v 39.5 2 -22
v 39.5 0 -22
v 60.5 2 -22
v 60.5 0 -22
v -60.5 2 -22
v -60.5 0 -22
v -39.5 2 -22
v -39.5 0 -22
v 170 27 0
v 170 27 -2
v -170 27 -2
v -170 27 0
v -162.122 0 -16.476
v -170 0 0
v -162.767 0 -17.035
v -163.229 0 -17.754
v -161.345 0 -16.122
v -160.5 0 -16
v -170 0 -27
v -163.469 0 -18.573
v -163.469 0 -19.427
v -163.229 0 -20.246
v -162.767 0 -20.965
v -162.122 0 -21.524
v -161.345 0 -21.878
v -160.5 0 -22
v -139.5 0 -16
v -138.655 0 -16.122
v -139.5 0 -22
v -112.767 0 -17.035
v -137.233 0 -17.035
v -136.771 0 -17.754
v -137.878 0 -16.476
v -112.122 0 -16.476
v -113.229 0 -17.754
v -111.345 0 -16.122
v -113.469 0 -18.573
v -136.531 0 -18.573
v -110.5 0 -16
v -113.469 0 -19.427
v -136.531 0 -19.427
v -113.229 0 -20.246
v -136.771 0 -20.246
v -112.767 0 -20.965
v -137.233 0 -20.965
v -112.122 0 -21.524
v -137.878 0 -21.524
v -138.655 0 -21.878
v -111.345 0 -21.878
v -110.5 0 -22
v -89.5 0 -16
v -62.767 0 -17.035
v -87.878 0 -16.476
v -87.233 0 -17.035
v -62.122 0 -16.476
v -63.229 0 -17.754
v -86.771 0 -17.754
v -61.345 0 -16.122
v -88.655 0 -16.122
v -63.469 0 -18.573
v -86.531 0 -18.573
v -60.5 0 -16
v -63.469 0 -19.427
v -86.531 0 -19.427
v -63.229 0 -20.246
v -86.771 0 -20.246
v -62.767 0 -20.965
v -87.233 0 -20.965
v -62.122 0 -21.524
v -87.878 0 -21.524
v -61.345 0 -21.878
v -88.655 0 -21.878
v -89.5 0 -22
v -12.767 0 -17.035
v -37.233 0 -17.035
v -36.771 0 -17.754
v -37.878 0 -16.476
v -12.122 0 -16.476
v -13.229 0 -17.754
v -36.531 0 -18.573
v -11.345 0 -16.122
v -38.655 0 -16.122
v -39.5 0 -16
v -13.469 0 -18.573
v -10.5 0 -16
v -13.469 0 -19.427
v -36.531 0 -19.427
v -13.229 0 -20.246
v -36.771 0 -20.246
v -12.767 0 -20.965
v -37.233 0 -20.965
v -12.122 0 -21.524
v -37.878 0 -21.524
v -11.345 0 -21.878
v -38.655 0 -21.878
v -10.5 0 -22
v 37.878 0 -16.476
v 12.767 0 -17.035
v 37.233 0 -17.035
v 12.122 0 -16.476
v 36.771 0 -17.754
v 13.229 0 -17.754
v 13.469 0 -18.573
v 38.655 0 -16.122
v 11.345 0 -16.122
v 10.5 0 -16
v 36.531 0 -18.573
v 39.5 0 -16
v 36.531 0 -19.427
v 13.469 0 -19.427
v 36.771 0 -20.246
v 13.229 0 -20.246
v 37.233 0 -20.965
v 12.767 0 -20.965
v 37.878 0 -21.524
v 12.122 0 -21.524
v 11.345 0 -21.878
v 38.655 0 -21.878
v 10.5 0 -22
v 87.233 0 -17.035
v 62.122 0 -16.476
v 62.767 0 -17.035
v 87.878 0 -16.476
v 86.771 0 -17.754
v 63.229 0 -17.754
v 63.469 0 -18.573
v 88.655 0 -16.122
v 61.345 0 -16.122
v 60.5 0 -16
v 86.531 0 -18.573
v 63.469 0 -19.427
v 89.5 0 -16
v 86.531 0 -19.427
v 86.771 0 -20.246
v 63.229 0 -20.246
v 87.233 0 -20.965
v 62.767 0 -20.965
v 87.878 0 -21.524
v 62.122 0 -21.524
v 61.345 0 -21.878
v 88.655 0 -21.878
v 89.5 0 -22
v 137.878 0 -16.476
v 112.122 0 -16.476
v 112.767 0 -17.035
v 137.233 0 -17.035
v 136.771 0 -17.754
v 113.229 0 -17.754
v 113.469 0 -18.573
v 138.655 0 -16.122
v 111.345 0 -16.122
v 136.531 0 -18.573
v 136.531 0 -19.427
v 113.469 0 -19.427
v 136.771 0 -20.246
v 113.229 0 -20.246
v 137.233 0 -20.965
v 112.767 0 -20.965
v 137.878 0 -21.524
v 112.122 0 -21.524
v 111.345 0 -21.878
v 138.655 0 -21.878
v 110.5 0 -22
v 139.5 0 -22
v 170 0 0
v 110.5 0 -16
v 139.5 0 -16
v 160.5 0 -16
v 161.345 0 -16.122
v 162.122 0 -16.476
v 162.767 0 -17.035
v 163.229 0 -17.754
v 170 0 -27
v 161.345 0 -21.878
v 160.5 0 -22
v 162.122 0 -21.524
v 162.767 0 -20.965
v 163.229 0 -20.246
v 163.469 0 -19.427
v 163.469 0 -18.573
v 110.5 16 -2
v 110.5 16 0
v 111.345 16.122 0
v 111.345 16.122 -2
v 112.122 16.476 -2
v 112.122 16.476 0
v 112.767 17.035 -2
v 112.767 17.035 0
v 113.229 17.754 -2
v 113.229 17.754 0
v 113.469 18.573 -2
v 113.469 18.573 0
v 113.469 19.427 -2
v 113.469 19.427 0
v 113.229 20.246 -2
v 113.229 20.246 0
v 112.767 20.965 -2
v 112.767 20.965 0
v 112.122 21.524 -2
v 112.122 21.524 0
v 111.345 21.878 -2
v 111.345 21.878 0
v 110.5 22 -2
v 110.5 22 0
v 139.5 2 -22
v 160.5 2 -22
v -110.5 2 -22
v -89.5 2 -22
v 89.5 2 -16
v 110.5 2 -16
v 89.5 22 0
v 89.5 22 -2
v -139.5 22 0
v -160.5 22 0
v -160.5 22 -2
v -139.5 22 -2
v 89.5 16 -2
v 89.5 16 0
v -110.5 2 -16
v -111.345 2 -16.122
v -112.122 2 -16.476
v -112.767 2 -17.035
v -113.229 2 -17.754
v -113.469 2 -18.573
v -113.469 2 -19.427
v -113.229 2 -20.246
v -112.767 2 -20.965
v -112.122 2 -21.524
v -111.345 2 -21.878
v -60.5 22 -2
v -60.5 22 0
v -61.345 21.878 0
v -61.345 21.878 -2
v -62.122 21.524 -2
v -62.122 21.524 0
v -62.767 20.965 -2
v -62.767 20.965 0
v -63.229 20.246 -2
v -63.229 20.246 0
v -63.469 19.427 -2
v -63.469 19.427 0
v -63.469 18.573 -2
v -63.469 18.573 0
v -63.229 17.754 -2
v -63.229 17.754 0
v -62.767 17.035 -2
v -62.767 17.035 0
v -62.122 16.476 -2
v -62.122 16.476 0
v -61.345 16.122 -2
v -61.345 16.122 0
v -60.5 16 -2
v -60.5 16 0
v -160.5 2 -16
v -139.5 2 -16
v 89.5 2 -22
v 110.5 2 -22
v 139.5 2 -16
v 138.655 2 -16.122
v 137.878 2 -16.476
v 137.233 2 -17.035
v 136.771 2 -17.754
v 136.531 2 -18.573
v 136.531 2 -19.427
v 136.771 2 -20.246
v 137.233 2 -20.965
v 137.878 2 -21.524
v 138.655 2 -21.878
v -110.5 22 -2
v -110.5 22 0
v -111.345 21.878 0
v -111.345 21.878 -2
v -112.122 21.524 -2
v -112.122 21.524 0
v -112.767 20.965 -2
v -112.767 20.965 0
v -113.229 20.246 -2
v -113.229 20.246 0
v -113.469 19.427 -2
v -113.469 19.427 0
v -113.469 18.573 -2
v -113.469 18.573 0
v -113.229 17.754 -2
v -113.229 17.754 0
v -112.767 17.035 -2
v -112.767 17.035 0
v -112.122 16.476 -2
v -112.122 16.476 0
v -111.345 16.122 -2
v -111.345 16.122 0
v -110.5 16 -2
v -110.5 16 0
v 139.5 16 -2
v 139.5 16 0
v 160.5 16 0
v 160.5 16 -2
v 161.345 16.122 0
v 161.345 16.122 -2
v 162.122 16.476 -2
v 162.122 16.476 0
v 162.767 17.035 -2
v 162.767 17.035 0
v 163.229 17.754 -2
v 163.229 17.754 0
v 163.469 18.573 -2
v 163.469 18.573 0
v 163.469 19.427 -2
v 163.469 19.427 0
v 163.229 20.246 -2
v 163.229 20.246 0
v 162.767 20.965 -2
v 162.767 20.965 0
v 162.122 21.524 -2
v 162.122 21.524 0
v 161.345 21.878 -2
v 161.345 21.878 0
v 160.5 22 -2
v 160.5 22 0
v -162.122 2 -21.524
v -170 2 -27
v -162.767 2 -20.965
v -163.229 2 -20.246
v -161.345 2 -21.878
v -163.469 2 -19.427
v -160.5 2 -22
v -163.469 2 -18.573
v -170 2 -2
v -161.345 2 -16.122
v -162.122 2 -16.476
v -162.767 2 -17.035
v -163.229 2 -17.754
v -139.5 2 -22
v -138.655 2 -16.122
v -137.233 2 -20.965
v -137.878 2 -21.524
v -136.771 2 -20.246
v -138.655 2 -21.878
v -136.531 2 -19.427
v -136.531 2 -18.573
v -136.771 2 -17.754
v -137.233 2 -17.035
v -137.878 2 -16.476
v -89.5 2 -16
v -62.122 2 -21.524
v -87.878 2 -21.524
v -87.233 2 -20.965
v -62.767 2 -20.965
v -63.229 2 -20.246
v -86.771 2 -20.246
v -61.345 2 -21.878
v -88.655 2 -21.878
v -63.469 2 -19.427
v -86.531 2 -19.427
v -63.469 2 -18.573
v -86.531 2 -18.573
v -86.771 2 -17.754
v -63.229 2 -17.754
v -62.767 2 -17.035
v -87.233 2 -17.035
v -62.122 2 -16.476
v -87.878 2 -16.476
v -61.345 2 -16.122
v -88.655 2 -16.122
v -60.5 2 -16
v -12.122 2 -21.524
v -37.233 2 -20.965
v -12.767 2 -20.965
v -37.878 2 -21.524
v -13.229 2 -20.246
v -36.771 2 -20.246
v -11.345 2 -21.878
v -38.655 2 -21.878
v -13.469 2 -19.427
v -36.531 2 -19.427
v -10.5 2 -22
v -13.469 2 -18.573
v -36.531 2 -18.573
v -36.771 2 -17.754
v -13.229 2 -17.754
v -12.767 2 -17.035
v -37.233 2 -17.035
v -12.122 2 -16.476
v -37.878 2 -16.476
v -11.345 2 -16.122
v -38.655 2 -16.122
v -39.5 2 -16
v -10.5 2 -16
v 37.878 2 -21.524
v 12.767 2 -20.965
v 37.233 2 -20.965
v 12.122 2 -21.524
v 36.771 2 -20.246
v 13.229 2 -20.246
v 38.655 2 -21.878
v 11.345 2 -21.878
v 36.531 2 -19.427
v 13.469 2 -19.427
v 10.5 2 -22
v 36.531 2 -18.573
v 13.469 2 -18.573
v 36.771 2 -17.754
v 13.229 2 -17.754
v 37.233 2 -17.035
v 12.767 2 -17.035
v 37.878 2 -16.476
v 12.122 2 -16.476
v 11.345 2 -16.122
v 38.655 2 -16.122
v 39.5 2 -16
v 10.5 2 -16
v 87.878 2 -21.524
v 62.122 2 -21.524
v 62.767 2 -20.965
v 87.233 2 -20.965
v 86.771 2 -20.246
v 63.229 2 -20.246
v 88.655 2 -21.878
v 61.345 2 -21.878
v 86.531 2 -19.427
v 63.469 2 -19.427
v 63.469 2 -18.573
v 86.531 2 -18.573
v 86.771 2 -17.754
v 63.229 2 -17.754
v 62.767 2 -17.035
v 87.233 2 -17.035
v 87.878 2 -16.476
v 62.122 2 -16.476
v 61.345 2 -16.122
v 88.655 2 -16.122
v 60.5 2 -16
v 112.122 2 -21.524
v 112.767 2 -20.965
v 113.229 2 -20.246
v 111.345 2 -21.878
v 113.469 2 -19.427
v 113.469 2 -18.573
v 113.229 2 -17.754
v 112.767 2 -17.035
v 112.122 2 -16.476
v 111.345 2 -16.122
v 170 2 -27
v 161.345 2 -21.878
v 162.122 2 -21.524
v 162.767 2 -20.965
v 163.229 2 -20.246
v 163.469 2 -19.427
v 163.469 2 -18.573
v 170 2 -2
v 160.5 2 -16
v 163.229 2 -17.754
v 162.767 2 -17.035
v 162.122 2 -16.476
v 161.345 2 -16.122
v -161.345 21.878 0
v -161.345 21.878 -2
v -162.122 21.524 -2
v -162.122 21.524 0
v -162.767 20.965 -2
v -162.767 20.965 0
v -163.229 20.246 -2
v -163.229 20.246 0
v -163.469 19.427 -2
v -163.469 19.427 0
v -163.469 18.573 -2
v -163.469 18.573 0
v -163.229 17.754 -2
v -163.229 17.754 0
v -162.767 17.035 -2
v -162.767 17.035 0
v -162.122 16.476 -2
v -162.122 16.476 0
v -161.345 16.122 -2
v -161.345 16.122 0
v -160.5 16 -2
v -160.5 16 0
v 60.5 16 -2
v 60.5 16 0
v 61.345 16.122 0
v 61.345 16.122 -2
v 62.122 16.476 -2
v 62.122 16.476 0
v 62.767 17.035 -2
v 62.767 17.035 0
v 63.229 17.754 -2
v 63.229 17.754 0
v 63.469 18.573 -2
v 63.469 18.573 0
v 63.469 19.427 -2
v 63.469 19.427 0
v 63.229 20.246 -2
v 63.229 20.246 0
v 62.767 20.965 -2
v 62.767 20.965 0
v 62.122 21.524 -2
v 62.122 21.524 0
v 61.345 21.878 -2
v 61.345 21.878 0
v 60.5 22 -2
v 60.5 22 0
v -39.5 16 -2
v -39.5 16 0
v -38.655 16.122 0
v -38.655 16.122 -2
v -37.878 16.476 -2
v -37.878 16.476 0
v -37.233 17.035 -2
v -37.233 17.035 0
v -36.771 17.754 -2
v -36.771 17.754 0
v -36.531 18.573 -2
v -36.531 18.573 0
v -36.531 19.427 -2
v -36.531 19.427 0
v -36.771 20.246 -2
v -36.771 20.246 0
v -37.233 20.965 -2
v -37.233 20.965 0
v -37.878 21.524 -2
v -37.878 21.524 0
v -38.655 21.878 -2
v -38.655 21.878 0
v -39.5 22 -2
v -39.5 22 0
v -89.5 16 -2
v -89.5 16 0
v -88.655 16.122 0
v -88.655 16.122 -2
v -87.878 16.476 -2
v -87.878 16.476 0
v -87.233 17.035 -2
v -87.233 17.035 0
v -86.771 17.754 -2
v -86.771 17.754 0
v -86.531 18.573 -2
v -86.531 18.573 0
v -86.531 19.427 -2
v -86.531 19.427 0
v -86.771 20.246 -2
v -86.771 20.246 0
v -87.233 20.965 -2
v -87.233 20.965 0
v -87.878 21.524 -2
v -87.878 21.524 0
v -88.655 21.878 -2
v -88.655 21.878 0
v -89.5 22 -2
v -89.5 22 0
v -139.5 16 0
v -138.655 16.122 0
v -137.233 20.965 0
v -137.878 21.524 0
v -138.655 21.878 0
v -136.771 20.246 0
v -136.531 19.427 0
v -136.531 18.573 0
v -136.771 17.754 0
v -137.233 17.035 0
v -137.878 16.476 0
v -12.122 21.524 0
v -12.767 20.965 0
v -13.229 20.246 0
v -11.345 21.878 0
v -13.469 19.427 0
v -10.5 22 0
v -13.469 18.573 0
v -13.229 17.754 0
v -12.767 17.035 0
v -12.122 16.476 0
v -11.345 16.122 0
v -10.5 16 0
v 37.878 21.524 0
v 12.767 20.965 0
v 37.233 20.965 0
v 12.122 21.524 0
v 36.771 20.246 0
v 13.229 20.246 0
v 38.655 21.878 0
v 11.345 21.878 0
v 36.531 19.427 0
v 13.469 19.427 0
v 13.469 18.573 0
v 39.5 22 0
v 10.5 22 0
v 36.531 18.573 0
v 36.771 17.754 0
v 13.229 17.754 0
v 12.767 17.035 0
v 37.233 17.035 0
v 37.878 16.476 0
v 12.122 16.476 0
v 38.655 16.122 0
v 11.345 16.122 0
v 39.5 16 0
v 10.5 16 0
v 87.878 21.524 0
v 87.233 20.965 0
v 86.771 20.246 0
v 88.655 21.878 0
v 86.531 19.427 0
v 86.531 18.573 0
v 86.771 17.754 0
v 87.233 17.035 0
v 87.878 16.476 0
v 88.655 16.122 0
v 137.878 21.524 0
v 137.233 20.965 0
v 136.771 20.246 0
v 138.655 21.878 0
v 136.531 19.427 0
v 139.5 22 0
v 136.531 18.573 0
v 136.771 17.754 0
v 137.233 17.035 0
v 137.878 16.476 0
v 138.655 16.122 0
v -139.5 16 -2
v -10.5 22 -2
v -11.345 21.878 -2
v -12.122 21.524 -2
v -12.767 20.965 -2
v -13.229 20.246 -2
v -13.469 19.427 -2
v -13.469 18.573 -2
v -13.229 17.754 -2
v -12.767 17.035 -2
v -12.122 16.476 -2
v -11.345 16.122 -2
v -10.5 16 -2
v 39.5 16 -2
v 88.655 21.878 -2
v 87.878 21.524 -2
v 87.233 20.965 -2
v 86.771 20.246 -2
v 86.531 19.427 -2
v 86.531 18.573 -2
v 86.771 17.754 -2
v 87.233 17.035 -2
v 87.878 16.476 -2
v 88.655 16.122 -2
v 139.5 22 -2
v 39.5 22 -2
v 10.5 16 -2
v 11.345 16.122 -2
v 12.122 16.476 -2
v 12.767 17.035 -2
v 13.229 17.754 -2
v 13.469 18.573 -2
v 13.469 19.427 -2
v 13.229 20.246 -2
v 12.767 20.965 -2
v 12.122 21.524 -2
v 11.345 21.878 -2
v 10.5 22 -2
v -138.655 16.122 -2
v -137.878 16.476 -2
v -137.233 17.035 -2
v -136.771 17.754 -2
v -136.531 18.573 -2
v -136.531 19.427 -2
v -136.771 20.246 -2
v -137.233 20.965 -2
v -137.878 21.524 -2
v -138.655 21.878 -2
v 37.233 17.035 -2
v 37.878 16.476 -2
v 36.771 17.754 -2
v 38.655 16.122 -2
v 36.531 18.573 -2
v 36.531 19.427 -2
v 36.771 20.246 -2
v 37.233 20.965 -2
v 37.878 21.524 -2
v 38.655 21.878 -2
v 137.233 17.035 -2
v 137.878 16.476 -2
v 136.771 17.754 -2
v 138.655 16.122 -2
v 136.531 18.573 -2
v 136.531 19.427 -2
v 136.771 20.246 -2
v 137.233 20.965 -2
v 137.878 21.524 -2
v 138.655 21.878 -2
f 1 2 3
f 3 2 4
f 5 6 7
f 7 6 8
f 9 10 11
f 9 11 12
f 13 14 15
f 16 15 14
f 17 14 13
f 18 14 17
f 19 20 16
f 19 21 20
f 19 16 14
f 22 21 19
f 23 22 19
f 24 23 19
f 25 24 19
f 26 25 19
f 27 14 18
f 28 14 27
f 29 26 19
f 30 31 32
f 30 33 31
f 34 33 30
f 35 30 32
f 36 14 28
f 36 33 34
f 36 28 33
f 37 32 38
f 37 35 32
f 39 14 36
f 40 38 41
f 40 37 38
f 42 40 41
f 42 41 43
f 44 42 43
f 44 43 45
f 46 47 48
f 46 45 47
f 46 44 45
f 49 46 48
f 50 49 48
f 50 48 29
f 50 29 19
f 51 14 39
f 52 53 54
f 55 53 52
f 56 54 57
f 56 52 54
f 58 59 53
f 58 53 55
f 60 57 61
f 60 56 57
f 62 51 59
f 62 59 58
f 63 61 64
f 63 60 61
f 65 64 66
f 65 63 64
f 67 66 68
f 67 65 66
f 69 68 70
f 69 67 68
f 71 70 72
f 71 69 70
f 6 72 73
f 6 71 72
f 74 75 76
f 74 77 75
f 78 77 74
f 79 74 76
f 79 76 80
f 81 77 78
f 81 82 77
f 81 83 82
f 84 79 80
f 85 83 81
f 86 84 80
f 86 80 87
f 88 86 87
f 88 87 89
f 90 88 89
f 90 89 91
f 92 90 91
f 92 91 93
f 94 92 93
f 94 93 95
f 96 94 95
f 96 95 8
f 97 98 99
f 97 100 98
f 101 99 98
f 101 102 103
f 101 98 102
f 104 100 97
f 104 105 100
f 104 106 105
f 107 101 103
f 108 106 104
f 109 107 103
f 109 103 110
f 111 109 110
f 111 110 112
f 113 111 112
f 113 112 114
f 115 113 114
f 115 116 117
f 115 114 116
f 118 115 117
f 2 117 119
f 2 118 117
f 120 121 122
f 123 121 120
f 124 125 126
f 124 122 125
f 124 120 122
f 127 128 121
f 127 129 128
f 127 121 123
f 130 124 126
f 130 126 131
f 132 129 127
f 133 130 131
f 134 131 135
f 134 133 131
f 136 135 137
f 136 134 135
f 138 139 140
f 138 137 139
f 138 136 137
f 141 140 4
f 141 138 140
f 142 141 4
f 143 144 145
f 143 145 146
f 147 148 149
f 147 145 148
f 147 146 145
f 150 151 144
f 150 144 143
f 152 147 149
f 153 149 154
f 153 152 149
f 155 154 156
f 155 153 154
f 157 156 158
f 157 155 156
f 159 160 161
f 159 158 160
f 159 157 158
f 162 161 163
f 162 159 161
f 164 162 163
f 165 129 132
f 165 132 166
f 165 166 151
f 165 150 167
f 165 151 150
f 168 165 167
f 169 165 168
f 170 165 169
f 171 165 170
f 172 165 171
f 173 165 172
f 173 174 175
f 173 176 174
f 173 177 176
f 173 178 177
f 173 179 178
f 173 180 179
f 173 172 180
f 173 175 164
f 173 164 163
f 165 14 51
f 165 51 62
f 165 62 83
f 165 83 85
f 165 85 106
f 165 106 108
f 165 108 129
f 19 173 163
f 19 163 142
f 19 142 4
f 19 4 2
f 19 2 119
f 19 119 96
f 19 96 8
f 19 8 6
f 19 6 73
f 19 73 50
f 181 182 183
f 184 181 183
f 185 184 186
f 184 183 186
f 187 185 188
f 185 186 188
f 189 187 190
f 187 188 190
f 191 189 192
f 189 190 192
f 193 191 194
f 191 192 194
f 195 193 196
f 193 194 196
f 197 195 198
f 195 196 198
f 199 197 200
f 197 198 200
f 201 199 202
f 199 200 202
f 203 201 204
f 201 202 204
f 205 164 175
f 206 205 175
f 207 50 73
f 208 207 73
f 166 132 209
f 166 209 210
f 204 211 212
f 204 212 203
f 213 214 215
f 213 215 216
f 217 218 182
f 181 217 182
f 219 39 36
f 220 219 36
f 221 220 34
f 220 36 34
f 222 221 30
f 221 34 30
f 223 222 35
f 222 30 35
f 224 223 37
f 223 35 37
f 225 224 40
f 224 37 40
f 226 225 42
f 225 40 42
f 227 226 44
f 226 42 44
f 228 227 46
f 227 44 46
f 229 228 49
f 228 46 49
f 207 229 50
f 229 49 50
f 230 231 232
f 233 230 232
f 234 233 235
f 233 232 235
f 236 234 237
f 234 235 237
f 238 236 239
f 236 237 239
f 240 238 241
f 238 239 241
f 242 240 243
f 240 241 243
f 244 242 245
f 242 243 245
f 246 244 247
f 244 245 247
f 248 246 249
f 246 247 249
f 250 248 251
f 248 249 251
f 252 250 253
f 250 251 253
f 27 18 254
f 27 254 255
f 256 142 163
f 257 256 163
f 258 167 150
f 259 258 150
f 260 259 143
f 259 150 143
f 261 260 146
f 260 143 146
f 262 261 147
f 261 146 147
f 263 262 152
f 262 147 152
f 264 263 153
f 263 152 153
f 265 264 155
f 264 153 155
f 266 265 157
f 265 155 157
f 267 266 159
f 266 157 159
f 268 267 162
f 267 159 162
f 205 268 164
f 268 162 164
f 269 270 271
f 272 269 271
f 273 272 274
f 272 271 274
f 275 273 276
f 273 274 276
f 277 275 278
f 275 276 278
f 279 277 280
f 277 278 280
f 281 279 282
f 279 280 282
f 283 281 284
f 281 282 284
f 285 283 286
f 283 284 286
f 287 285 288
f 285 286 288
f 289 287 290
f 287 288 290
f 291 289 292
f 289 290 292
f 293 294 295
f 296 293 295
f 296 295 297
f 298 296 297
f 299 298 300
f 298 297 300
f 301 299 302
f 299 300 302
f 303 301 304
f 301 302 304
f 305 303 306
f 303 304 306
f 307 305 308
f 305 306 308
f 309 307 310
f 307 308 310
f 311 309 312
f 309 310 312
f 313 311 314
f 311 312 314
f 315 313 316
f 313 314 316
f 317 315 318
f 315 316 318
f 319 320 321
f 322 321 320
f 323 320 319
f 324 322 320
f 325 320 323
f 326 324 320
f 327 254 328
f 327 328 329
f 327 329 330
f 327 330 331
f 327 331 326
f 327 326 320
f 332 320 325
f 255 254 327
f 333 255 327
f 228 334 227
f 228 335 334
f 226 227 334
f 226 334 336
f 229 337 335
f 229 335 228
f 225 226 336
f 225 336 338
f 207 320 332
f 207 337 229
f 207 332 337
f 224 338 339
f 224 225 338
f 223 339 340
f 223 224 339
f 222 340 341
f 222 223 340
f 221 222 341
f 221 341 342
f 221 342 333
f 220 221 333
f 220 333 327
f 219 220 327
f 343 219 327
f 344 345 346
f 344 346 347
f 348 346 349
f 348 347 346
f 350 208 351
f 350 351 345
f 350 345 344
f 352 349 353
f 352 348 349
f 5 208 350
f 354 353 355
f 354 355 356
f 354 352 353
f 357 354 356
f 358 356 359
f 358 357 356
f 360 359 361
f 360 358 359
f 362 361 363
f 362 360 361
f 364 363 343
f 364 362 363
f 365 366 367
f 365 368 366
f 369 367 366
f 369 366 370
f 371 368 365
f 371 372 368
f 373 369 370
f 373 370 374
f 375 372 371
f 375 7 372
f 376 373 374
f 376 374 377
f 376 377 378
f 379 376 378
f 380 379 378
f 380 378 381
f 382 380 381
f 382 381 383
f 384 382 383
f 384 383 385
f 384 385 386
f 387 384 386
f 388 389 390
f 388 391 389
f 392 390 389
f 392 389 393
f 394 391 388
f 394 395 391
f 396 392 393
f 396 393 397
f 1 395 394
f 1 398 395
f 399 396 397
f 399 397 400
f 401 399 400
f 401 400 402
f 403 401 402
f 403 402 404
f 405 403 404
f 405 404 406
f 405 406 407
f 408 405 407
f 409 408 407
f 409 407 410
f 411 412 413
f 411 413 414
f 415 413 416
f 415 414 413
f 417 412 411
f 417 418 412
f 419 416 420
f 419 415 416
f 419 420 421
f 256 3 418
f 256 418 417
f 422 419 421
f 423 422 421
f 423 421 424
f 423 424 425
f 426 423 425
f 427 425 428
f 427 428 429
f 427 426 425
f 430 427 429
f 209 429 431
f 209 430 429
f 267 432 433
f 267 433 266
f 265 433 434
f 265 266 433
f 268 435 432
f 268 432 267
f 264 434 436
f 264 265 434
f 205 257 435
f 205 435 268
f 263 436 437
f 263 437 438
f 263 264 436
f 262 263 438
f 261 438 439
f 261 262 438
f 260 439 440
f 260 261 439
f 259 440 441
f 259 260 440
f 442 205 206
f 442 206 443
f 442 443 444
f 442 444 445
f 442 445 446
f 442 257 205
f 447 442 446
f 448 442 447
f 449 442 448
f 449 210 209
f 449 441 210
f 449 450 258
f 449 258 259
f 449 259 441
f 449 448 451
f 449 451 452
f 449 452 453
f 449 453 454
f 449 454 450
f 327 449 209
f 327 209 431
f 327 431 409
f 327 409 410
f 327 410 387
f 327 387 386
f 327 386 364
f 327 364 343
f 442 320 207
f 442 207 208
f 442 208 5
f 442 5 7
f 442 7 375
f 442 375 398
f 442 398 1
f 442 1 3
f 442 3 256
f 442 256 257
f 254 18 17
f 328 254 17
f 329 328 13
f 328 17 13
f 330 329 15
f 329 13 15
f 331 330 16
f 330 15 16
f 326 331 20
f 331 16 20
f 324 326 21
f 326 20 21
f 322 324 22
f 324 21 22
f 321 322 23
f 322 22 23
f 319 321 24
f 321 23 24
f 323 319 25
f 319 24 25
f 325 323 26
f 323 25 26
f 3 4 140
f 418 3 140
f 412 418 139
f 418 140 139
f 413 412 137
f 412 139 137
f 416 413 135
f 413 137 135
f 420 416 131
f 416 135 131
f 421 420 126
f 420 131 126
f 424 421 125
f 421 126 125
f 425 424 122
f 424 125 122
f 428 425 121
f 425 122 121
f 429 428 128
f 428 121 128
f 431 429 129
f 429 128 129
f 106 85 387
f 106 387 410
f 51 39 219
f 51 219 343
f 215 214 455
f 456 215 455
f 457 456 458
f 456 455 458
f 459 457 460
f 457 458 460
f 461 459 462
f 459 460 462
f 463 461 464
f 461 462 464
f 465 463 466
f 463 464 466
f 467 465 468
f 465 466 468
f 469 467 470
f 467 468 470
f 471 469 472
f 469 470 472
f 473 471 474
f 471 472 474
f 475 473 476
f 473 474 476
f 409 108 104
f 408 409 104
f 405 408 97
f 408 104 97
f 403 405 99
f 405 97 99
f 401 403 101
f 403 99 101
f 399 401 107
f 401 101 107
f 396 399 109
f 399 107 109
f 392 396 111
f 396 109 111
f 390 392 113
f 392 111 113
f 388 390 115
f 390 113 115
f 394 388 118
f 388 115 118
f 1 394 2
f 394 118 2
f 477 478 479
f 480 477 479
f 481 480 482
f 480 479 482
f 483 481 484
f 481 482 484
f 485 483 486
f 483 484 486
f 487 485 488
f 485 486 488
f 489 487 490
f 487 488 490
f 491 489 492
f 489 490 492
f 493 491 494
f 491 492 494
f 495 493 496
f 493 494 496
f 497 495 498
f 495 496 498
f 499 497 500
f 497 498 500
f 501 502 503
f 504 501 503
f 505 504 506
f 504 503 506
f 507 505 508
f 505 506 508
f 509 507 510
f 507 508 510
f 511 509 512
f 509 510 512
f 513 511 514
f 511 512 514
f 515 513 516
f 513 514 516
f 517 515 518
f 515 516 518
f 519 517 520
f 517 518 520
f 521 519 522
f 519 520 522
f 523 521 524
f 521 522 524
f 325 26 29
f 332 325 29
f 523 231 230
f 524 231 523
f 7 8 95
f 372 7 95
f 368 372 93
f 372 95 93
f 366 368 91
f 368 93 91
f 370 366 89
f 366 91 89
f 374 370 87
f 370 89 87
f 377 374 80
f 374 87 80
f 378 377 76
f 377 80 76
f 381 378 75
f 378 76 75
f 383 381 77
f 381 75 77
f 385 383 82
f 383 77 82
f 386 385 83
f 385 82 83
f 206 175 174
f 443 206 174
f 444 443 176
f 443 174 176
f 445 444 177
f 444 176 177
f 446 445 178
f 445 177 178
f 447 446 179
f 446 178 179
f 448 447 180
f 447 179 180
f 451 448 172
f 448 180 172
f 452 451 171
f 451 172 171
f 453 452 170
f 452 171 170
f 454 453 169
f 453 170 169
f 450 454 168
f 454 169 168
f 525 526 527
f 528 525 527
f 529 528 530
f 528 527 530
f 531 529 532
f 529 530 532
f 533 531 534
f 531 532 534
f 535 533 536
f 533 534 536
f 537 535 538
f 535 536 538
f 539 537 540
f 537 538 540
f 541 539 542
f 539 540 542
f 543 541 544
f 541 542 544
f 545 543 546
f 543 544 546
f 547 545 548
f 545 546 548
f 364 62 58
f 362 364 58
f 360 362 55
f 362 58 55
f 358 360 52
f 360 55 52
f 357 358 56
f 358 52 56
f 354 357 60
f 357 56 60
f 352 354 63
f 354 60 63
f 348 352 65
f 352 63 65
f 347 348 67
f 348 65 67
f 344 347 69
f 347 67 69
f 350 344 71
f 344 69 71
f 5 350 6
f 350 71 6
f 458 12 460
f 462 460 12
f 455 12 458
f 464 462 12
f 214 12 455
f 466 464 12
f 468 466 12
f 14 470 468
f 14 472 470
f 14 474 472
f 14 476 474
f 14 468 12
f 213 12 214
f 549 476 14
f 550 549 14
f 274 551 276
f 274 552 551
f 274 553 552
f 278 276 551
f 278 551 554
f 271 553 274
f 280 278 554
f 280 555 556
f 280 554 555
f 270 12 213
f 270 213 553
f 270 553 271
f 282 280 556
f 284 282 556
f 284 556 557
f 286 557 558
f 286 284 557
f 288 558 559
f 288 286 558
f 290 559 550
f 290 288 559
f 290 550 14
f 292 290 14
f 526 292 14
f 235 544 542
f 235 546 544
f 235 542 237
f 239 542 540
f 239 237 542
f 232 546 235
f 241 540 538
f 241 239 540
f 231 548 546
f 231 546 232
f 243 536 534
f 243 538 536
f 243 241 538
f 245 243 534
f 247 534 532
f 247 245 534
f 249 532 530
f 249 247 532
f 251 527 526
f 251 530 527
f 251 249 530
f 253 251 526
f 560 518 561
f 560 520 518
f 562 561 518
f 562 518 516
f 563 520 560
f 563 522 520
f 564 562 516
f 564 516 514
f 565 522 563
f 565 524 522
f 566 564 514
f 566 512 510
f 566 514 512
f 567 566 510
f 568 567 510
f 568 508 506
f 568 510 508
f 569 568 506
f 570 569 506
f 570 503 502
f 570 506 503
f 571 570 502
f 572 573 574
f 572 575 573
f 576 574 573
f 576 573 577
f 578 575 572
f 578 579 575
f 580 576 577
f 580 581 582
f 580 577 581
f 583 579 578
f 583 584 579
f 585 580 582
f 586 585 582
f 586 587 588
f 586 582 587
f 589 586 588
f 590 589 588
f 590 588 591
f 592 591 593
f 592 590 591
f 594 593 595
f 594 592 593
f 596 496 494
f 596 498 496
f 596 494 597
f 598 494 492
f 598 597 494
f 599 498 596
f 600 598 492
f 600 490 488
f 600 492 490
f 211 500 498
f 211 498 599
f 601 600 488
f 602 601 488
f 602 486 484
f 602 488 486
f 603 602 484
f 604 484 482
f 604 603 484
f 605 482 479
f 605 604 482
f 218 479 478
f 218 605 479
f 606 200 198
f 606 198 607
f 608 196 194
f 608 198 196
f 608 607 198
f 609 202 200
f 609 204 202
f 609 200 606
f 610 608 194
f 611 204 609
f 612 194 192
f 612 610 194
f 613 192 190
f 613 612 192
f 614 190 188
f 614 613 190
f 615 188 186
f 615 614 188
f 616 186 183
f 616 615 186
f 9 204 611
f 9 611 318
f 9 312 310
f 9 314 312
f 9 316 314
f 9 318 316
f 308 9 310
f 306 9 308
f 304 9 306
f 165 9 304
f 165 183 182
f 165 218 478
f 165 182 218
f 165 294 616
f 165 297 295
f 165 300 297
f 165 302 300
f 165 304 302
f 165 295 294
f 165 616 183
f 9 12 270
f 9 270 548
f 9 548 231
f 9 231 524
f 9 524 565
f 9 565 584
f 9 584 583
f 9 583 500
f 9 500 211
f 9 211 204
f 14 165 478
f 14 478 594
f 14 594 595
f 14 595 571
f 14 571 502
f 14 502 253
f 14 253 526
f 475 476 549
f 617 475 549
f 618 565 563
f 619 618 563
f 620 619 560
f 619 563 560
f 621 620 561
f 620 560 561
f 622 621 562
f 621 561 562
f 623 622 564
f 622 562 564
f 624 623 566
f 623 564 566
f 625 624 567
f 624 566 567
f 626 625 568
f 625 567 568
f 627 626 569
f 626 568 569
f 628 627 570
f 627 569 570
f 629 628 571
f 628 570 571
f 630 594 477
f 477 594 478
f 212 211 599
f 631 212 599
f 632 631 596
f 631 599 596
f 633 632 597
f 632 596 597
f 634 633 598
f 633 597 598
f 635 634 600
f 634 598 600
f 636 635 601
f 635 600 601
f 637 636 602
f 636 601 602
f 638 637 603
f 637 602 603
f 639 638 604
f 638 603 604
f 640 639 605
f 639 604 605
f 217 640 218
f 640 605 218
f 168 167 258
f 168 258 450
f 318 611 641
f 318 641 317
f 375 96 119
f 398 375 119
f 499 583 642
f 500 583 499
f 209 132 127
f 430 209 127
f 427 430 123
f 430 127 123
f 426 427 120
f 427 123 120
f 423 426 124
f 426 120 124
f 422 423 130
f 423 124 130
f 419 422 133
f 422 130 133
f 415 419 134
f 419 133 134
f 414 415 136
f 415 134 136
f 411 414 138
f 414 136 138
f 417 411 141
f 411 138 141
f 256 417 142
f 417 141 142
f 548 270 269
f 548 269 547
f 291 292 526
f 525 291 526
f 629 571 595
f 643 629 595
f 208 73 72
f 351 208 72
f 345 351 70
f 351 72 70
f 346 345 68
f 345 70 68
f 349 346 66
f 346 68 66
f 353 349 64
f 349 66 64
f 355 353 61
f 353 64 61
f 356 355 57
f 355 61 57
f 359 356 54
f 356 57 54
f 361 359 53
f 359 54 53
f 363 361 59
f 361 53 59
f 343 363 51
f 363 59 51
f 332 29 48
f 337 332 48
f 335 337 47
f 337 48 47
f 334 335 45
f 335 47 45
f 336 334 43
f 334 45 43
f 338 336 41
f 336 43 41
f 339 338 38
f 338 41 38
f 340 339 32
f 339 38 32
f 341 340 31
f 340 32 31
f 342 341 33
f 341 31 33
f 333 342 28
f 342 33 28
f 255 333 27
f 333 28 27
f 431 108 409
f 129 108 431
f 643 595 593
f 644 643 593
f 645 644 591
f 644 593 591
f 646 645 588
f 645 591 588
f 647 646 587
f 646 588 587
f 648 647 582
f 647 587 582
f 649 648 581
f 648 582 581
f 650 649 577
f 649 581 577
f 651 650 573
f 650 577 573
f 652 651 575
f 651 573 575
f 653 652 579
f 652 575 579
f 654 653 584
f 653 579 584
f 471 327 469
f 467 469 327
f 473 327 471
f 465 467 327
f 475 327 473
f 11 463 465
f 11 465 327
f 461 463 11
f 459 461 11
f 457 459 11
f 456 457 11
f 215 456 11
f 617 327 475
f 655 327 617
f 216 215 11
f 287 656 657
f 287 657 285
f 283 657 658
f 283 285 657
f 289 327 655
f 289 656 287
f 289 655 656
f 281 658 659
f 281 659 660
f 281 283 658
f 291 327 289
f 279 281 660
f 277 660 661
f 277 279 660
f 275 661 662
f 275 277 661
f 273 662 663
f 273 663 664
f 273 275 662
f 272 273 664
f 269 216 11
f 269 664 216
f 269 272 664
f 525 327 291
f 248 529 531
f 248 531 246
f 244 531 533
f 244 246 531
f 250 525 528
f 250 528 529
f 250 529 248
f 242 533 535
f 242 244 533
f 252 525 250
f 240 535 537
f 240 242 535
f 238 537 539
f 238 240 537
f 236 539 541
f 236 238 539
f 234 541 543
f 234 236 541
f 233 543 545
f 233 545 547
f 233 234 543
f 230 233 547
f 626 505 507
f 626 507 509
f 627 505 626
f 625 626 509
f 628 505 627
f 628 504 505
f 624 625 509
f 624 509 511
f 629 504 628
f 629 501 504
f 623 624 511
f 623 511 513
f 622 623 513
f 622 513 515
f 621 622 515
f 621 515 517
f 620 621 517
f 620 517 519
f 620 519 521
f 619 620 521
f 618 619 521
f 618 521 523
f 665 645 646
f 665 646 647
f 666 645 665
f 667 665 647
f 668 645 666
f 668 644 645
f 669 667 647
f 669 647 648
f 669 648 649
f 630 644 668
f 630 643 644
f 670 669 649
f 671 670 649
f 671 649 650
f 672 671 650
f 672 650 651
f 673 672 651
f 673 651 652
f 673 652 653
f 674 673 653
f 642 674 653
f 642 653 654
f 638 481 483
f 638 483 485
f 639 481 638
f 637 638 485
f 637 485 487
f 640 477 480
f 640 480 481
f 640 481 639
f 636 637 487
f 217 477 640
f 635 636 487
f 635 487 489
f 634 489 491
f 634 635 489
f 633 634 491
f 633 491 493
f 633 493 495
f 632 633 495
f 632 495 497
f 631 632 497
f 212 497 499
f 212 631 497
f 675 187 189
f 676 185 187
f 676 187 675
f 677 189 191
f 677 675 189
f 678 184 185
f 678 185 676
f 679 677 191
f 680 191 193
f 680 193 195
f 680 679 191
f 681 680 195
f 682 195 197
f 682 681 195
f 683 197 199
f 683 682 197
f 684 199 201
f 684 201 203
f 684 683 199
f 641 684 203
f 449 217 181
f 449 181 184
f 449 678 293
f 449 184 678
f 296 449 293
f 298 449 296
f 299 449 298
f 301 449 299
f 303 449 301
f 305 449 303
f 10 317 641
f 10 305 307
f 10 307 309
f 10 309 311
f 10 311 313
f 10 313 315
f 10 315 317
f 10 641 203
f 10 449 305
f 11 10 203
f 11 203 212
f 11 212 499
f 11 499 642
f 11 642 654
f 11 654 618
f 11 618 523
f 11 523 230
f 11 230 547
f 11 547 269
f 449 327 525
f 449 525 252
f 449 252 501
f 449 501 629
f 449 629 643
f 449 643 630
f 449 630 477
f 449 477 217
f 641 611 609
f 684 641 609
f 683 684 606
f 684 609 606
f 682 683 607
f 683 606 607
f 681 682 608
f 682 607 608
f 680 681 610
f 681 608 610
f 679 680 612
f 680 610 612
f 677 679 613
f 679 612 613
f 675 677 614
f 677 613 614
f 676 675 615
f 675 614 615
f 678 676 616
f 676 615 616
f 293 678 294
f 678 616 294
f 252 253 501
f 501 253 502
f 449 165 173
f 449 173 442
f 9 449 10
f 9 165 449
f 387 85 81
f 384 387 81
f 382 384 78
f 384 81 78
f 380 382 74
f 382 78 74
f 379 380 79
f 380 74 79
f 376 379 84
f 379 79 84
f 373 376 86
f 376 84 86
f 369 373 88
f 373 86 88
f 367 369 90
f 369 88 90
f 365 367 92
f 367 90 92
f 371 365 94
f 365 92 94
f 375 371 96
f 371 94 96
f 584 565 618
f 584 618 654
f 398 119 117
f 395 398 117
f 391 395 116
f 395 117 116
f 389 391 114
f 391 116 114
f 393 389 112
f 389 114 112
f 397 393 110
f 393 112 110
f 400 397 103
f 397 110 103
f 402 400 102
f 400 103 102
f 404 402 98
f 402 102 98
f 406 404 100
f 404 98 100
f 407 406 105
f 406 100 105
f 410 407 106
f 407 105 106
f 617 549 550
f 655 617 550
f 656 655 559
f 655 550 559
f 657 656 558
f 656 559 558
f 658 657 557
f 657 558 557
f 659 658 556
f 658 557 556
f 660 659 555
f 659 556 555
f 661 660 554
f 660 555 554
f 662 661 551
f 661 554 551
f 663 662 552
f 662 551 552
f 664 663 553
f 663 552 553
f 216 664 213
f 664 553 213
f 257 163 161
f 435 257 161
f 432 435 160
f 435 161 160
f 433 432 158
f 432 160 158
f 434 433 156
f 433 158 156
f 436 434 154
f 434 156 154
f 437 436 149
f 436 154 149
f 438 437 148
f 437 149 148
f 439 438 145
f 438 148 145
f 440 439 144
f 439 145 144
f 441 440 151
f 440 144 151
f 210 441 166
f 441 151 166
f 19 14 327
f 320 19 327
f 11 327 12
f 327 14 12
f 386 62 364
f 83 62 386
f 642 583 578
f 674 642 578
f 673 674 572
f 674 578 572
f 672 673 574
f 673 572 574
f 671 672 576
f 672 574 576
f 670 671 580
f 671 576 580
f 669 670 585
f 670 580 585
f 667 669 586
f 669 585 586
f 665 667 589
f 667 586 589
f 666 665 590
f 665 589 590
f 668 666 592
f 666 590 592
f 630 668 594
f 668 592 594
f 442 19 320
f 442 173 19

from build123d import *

# Parameters (mm, degrees)
PAD005_DEPTH           = 170
POCKET001_DEPTH        = 5
LINEARPATTERN_COUNT    = 4
LINEARPATTERN_PITCH    = 50
LINEARPATTERN001_COUNT = 4
LINEARPATTERN001_PITCH = 50
POCKET002_DEPTH        = 5
LINEARPATTERN002_COUNT = 4
LINEARPATTERN002_PITCH = 50
LINEARPATTERN003_COUNT = 4
LINEARPATTERN003_PITCH = 50


with BuildPart() as part:
    # Sketch006 → Pad005 (new body, symmetric)
    with BuildSketch(Plane.YZ):
        Polygon((2, -2), (27, -2), (27, 0), (0, 0), (0, -27), (2, -27), align=None)
    extrude(amount=PAD005_DEPTH, both=True)

    # Sketch007 → Pocket001 (cut)
    with BuildSketch(Plane.XZ):
        with BuildLine():
            ThreePointArc((-10.5, -16), (-13.5, -19), (-10.5, -22))
            Line((-10.5, -22), (10.5, -22))
            ThreePointArc((10.5, -22), (13.5, -19), (10.5, -16))
            Line((-10.5, -16), (10.5, -16))
        make_face()
    pocket001 = extrude(amount=-POCKET001_DEPTH, mode=Mode.SUBTRACT)

    # LinearPattern: Pocket001 ×4
    with Locations(*[(i * LINEARPATTERN_PITCH, 0, 0) for i in range(1, LINEARPATTERN_COUNT)]):
        add(pocket001, mode=Mode.SUBTRACT)

    # LinearPattern001: Pocket001 ×4
    with Locations(*[(-i * LINEARPATTERN001_PITCH, 0, 0) for i in range(1, LINEARPATTERN001_COUNT)]):
        add(pocket001, mode=Mode.SUBTRACT)

    # Sketch008 → Pocket002 (cut)
    with BuildSketch(Plane.XY):
        with BuildLine():
            ThreePointArc((-10.5, 22), (-13.5, 19), (-10.5, 16))
            Line((-10.5, 16), (10.5, 16))
            ThreePointArc((10.5, 16), (13.5, 19), (10.5, 22))
            Line((-10.5, 22), (10.5, 22))
        make_face()
    pocket002 = extrude(amount=-POCKET002_DEPTH, mode=Mode.SUBTRACT)

    # LinearPattern002: Pocket002 ×4
    with Locations(*[(i * LINEARPATTERN002_PITCH, 0, 0) for i in range(1, LINEARPATTERN002_COUNT)]):
        add(pocket002, mode=Mode.SUBTRACT)

    # LinearPattern003: Pocket002 ×4
    with Locations(*[(-i * LINEARPATTERN003_PITCH, 0, 0) for i in range(1, LINEARPATTERN003_COUNT)]):
        add(pocket002, mode=Mode.SUBTRACT)


solid = part.part
